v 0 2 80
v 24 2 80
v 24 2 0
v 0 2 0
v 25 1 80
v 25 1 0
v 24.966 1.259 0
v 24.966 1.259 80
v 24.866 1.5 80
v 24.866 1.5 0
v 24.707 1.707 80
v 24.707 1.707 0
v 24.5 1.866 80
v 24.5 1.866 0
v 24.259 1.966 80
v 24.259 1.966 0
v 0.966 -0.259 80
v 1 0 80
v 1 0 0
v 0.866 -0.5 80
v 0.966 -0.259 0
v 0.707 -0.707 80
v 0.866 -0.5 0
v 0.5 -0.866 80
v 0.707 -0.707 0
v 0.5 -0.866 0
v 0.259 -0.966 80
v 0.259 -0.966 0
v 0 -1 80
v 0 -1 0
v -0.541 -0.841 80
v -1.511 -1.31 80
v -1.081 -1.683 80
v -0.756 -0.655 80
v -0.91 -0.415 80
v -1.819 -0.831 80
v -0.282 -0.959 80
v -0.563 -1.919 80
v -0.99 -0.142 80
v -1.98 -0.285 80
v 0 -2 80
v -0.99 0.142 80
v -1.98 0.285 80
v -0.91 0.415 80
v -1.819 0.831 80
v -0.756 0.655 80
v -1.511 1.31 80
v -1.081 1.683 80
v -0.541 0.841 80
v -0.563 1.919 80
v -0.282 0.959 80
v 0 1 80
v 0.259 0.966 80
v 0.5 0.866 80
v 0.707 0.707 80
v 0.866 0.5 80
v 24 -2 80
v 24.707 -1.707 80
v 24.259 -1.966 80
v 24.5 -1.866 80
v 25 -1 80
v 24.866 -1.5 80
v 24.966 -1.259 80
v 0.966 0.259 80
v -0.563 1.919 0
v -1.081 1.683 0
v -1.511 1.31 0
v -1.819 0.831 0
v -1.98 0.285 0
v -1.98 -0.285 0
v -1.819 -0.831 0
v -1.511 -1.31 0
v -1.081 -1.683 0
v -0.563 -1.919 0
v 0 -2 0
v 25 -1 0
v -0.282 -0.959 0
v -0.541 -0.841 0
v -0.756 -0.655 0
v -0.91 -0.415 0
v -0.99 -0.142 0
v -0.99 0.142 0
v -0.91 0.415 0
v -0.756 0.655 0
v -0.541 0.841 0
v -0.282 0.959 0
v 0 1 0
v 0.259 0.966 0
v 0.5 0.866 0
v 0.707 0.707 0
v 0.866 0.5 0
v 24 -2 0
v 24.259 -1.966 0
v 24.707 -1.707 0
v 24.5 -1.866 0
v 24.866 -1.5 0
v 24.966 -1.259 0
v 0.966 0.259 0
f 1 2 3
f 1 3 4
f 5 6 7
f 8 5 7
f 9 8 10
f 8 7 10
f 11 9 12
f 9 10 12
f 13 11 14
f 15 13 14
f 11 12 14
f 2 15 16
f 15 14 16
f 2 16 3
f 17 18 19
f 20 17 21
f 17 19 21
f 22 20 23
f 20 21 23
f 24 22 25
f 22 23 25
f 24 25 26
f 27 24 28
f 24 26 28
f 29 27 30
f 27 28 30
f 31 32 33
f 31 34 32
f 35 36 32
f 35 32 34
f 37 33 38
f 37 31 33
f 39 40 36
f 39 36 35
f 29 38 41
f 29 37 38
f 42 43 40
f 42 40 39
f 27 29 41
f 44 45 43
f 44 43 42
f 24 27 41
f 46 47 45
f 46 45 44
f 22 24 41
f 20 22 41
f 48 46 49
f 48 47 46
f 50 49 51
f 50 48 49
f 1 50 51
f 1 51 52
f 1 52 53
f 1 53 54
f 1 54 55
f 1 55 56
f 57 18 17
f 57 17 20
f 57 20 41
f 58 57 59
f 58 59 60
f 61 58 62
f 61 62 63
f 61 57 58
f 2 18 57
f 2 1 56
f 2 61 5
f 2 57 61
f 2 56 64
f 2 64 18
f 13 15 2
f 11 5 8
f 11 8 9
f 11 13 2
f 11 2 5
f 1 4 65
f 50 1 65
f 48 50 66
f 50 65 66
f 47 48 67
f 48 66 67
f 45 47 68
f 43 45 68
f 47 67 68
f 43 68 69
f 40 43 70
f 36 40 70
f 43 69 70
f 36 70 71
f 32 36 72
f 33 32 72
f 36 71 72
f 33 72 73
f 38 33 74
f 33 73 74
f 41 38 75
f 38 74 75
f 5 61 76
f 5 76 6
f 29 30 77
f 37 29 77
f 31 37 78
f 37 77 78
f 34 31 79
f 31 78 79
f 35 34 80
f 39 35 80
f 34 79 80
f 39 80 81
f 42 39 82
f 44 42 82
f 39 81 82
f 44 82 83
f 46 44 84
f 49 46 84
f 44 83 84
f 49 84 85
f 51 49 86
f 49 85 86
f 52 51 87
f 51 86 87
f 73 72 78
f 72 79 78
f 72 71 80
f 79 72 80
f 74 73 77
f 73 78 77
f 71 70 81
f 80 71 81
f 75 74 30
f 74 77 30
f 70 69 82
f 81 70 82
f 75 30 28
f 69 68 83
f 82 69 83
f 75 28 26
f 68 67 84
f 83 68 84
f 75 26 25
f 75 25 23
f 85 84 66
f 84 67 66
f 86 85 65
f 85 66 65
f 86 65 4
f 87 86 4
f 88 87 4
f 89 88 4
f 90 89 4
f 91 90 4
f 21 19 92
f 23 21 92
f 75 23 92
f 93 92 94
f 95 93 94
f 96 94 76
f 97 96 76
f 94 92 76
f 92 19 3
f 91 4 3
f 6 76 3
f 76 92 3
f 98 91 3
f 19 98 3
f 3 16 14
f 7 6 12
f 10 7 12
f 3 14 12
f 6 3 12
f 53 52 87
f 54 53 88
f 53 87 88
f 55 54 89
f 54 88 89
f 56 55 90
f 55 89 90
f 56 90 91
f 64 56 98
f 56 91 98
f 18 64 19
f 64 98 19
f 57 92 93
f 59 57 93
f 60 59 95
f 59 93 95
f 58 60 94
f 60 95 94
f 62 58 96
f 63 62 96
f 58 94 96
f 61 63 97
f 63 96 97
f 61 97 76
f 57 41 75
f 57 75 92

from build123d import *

# Parameters (mm, degrees)
EXTRUDE_1_DEPTH = 80


with BuildPart() as part:
    # 草图1 → 凸台-拉伸1 (new body)
    with BuildSketch(Plane.XY):
        with BuildLine():
            ThreePointArc((0, 2), (-2, 0), (0, -2))
            Line((0, -2), (0, -1))
            ThreePointArc((0, -1), (-1, 0), (0, 1))
            Line((0, 1), (0, 2))
        make_face()
        with BuildLine():
            Line((0, -1), (0, -2))
            ThreePointArc((0, -2), (1.414213562, -1.414213562), (2, 0))
            ThreePointArc((2, 0), (1.414213562, 1.414213562), (0, 2))
            Line((0, 2), (0, 1))
            ThreePointArc((0, 1), (0.707106781, 0.707106781), (1, 0))
            ThreePointArc((1, 0), (0.707106781, -0.707106781), (0, -1))
        make_face()
        with BuildLine():
            ThreePointArc((2, 0), (1.414213562, -1.414213562), (0, -2))
            Line((0, -2), (24, -2))
            ThreePointArc((24, -2), (24.707106781, -1.707106781), (25, -1))
            Line((25, -1), (25, 1))
            ThreePointArc((25, 1), (24.707106781, 1.707106781), (24, 2))
            Line((24, 2), (0, 2))
            ThreePointArc((0, 2), (1.414213562, 1.414213562), (2, 0))
        make_face()
    extrude(amount=EXTRUDE_1_DEPTH)


solid = part.part
